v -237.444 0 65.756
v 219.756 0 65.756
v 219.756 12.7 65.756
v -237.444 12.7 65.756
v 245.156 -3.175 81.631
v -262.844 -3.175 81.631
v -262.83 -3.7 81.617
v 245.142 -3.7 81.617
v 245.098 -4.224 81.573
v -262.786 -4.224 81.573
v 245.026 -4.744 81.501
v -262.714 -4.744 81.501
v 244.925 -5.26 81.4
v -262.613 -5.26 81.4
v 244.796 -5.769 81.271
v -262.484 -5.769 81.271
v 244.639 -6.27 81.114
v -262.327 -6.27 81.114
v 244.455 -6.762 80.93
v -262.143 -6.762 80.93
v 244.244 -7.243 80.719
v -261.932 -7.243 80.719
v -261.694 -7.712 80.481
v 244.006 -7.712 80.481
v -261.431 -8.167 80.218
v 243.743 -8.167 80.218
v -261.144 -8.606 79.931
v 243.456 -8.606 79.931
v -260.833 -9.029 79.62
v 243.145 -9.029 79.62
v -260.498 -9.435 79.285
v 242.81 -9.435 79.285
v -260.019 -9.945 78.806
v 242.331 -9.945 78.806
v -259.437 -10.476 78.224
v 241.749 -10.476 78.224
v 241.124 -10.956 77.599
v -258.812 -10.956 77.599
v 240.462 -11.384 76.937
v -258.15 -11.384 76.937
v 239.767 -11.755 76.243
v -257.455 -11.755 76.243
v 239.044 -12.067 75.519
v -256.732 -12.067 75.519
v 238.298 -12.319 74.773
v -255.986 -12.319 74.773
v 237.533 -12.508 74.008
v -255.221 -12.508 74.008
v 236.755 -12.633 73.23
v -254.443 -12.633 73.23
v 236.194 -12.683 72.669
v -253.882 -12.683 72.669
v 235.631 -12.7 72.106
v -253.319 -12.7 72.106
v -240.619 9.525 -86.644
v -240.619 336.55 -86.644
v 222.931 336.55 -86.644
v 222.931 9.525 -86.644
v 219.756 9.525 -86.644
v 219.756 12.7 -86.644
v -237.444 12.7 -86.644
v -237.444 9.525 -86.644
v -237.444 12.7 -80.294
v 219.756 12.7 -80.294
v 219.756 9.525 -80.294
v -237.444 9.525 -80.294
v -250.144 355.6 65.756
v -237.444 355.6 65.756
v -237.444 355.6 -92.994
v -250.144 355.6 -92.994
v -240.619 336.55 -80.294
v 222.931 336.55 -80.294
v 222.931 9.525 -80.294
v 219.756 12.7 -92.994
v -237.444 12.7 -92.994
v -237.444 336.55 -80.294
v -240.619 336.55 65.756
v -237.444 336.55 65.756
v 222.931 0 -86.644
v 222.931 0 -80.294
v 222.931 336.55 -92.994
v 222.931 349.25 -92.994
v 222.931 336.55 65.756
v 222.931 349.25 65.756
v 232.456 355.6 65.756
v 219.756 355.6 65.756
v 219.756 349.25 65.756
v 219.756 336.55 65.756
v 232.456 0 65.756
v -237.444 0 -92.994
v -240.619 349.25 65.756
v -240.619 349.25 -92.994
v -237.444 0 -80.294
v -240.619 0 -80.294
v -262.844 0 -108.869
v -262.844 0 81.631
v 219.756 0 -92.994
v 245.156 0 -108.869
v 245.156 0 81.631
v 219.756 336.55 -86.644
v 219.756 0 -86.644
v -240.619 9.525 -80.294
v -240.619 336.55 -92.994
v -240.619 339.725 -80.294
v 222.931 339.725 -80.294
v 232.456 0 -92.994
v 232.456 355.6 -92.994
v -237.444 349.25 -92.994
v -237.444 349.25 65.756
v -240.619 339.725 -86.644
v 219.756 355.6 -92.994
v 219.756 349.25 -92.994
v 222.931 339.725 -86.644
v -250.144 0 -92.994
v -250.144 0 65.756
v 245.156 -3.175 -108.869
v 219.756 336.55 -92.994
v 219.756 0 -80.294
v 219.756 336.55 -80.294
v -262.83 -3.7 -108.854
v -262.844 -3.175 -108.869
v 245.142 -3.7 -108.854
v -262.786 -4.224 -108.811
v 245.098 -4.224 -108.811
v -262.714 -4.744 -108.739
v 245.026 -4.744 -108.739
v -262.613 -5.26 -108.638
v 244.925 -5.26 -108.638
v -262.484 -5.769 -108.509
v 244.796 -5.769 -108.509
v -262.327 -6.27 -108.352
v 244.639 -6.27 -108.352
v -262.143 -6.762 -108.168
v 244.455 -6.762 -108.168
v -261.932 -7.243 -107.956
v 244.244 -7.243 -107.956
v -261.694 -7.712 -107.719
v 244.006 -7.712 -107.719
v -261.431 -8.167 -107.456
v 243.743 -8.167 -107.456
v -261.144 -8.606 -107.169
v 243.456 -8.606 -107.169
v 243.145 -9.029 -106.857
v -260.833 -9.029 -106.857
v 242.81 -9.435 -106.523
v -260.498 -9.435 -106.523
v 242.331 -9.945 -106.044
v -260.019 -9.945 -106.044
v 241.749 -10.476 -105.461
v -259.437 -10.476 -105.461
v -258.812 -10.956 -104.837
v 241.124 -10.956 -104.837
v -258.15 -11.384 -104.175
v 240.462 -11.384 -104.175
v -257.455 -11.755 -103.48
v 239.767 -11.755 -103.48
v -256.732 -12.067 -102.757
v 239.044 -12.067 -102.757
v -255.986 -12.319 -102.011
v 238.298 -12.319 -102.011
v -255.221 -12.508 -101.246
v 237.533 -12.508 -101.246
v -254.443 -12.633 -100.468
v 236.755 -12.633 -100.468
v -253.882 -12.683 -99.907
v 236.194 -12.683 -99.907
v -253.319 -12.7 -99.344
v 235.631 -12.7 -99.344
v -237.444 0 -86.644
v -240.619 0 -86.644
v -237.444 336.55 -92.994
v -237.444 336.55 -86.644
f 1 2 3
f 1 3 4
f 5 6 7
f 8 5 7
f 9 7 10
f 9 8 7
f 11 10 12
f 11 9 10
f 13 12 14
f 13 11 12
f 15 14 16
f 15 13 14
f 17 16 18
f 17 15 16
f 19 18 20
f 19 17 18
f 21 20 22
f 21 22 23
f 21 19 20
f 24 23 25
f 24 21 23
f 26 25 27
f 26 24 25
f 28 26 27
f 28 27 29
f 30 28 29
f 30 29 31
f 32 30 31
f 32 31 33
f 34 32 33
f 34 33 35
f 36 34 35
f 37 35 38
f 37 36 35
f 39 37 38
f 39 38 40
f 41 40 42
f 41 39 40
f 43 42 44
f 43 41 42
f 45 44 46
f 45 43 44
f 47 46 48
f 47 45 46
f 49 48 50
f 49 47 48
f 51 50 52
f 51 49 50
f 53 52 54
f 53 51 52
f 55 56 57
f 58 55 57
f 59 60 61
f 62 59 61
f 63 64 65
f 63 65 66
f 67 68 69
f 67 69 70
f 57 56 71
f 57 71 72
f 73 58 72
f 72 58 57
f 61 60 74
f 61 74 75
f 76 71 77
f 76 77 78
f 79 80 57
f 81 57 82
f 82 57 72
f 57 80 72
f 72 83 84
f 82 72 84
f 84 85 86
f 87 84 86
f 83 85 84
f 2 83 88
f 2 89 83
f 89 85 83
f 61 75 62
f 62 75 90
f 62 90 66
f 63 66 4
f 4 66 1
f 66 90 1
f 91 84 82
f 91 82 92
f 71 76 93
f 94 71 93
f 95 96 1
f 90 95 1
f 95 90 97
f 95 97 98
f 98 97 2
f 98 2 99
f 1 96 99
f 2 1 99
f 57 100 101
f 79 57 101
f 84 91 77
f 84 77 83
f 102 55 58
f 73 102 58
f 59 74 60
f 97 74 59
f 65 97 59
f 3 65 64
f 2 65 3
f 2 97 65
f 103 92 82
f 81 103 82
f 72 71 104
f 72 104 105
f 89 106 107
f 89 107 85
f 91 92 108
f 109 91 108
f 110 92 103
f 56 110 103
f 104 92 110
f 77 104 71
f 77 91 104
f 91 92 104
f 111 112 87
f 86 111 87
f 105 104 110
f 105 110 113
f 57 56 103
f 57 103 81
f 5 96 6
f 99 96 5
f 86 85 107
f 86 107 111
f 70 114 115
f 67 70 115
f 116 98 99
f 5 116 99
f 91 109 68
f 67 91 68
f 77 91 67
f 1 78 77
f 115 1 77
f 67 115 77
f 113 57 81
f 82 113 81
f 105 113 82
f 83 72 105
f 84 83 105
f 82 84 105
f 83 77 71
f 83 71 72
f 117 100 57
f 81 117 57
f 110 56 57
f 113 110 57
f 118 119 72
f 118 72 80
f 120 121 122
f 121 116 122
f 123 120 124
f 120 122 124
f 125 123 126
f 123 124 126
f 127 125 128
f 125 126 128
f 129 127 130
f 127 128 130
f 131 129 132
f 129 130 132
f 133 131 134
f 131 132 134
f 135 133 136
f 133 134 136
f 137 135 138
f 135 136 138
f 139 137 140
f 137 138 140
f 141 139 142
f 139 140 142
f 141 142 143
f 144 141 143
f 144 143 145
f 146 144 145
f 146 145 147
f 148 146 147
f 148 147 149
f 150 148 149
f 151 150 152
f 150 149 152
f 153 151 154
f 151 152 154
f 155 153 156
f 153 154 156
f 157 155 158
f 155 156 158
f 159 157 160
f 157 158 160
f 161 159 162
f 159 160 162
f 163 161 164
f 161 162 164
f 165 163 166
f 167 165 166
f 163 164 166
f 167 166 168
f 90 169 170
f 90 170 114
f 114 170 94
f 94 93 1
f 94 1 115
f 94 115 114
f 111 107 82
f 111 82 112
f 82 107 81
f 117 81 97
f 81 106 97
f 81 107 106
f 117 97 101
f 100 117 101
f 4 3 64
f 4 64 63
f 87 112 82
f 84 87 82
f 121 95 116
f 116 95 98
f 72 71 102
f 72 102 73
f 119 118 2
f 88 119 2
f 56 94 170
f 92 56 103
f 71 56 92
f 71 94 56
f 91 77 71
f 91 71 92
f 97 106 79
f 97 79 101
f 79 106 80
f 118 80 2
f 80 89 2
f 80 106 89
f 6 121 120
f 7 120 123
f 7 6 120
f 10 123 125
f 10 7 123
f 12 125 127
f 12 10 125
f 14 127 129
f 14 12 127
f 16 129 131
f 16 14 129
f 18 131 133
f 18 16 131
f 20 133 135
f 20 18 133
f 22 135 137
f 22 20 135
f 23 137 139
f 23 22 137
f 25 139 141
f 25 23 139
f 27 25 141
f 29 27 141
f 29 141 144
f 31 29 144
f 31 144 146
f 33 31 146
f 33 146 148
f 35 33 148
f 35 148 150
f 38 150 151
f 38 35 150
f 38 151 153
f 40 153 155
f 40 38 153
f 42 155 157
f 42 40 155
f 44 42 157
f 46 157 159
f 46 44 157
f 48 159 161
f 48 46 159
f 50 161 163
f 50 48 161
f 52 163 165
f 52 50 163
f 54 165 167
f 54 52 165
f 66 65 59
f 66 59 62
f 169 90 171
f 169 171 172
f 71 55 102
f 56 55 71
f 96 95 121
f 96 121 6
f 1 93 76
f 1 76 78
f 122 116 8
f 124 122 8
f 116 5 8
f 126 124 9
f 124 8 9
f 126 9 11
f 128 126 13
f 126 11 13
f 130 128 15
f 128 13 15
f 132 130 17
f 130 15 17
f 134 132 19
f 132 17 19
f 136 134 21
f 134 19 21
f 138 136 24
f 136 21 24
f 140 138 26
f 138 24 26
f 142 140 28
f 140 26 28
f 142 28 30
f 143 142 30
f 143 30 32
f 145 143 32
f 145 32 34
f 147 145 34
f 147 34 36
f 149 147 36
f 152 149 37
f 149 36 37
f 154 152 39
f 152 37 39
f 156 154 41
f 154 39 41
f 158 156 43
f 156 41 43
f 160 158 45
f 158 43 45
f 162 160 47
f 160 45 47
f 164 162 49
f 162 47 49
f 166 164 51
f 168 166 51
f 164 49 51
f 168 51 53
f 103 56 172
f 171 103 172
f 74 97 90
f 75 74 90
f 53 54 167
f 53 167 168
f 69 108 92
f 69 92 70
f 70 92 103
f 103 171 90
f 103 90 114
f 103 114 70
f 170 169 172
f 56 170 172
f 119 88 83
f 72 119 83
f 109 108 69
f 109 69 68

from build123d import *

# Parameters (mm, degrees)
F0_W      = 508
F0_H      = 190.5
F1_DEPTH  = 12.7
F2_R      = 9.525
F3_W      = 457.2
F3_H      = 158.75
F4_DEPTH  = 12.7
F5_W      = 12.7
F5_H      = 158.75
F6_DEPTH  = 355.6
F7_W      = 12.7
F7_H      = 158.75
F8_DEPTH  = 355.6
F9_W      = 3.175
F9_H      = 12.7
F10_DEPTH = 174.626
F11_W     = 3.175
F11_H     = 12.7
F12_DEPTH = 174.626
F14_DEPTH = 158.75
F15_W     = 463.55
F15_H     = 6.35
F16_DEPTH = 3.175
F17_W     = 336.55
F17_H     = 6.35
F18_DEPTH = 3.175
F20_DEPTH = 3.175
F21_W     = 457.2
F21_H     = 6.35
F22_DEPTH = 3.175
F23_W     = 463.55
F23_H     = 327.025
F24_DEPTH = 6.35


# Not quite as in the source:
# - a feature names something its author has since deleted; it is built from what else it names


with BuildPart() as f1:
    # F0 (on Front) → F1 (new body)
    with BuildSketch(Plane.XZ):
        with Locations((-8.8439956307, -13.6189054852)):
            Rectangle(F0_W, F0_H)
    extrude(amount=F1_DEPTH)

    # F2
    f2_edges = [f1.edges().sort_by_distance(p)[0] for p in [
        (-8.843996, -12.7, 81.631095),
        (-262.843996, -12.7, -13.618905),
        (-8.843996, -12.7, -108.868905),
        (245.156004, -12.7, -13.618905),
    ]]
    fillet(f2_edges, radius=F2_R)

    # F3 (on face) → F4 (join)
    with BuildSketch(Plane(origin=(0, 0, 0), x_dir=(-1, 0, 0), z_dir=(0, 1, 0))):
        with Locations((8.8439956307, -13.6189054852)):
            Rectangle(F3_W, F3_H)
    extrude(amount=F4_DEPTH)

    # F21 (on face) → F22 (cut)
    with BuildSketch(Plane(origin=(0, 12.7, 0), x_dir=(-1, 0, 0), z_dir=(0, 1, 0))):
        with Locations((8.8439956307, -83.4689054852)):
            Rectangle(F21_W, F21_H)
    extrude(amount=-F22_DEPTH, mode=Mode.SUBTRACT)


with BuildPart() as f6:
    # F5 (on face) → F6 (new body)
    with BuildSketch(Plane(origin=(0, 0, 0), x_dir=(-1, 0, 0), z_dir=(0, 1, 0))):
        with Locations((-226.1060043693, -13.6189054852)):
            Rectangle(F5_W, F5_H)
    extrude(amount=F6_DEPTH)

    # F11 (on face) → F12 (cut, through all)
    with BuildSketch(Plane.XY.offset(65.7560945148)):
        with Locations((221.3435043693, 342.9)):
            Rectangle(F11_W, F11_H)
    extrude(amount=-F12_DEPTH, mode=Mode.SUBTRACT)

    # F17 (on face) → F18 (cut)
    with BuildSketch(Plane(origin=(219.7560043693, 0, 0), x_dir=(0, -1, 0), z_dir=(-1, 0, 0))):
        with Locations((-168.275, -83.4689054852)):
            Rectangle(F17_W, F17_H)
    extrude(amount=-F18_DEPTH, mode=Mode.SUBTRACT)


with BuildPart() as f8:
    # F7 (on face) → F8 (new body)
    with BuildSketch(Plane(origin=(0, 0, 0), x_dir=(-1, 0, 0), z_dir=(0, 1, 0))):
        with Locations((243.7939956307, -13.6189054852)):
            Rectangle(F7_W, F7_H)
    extrude(amount=F8_DEPTH)

    # F9 (on face) → F10 (cut, through all)
    with BuildSketch(Plane.XY.offset(65.7560945148)):
        with Locations((-239.0314956307, 342.9)):
            Rectangle(F9_W, F9_H)
    extrude(amount=-F10_DEPTH, mode=Mode.SUBTRACT)

    # F19 (on face) → F20 (cut)
    with BuildSketch(Plane.YZ.offset(-237.4439956307)):
        Polygon((0, -85.2191895247), (0, -86.6439054852), (5.2507231012, -86.6439054852), (336.55, -86.6439054852), (336.55, -80.2939054852), (0, -80.2939054852), align=None)
    extrude(amount=-F20_DEPTH, mode=Mode.SUBTRACT)


with BuildPart() as f14:
    # F13 (on face) → F14 (new body)
    with BuildSketch(Plane.XY.offset(65.7560945148)):
        Polygon((-237.4439956307, 349.25), (-240.6189956307, 349.25), (-240.6189956307, 336.55), (-237.4439956307, 336.55), (222.9310043693, 336.55), (222.9310043693, 349.25), align=None)
    extrude(amount=-F14_DEPTH)

    # F15 (on face) → F16 (cut)
    with BuildSketch(Plane.XZ.offset(-336.55)):
        with Locations((-8.8439956307, -83.4689054852)):
            Rectangle(F15_W, F15_H)
    extrude(amount=-F16_DEPTH, mode=Mode.SUBTRACT)


with BuildPart() as f24:
    # F23 (on face) → F24 (new body)
    with BuildSketch(Plane.XY.offset(-86.6439054852)):
        with Locations((-8.8439956307, 173.0375)):
            Rectangle(F23_W, F23_H)
    extrude(amount=F24_DEPTH)


solid = Compound([f1.part, f6.part, f8.part, f14.part, f24.part])
